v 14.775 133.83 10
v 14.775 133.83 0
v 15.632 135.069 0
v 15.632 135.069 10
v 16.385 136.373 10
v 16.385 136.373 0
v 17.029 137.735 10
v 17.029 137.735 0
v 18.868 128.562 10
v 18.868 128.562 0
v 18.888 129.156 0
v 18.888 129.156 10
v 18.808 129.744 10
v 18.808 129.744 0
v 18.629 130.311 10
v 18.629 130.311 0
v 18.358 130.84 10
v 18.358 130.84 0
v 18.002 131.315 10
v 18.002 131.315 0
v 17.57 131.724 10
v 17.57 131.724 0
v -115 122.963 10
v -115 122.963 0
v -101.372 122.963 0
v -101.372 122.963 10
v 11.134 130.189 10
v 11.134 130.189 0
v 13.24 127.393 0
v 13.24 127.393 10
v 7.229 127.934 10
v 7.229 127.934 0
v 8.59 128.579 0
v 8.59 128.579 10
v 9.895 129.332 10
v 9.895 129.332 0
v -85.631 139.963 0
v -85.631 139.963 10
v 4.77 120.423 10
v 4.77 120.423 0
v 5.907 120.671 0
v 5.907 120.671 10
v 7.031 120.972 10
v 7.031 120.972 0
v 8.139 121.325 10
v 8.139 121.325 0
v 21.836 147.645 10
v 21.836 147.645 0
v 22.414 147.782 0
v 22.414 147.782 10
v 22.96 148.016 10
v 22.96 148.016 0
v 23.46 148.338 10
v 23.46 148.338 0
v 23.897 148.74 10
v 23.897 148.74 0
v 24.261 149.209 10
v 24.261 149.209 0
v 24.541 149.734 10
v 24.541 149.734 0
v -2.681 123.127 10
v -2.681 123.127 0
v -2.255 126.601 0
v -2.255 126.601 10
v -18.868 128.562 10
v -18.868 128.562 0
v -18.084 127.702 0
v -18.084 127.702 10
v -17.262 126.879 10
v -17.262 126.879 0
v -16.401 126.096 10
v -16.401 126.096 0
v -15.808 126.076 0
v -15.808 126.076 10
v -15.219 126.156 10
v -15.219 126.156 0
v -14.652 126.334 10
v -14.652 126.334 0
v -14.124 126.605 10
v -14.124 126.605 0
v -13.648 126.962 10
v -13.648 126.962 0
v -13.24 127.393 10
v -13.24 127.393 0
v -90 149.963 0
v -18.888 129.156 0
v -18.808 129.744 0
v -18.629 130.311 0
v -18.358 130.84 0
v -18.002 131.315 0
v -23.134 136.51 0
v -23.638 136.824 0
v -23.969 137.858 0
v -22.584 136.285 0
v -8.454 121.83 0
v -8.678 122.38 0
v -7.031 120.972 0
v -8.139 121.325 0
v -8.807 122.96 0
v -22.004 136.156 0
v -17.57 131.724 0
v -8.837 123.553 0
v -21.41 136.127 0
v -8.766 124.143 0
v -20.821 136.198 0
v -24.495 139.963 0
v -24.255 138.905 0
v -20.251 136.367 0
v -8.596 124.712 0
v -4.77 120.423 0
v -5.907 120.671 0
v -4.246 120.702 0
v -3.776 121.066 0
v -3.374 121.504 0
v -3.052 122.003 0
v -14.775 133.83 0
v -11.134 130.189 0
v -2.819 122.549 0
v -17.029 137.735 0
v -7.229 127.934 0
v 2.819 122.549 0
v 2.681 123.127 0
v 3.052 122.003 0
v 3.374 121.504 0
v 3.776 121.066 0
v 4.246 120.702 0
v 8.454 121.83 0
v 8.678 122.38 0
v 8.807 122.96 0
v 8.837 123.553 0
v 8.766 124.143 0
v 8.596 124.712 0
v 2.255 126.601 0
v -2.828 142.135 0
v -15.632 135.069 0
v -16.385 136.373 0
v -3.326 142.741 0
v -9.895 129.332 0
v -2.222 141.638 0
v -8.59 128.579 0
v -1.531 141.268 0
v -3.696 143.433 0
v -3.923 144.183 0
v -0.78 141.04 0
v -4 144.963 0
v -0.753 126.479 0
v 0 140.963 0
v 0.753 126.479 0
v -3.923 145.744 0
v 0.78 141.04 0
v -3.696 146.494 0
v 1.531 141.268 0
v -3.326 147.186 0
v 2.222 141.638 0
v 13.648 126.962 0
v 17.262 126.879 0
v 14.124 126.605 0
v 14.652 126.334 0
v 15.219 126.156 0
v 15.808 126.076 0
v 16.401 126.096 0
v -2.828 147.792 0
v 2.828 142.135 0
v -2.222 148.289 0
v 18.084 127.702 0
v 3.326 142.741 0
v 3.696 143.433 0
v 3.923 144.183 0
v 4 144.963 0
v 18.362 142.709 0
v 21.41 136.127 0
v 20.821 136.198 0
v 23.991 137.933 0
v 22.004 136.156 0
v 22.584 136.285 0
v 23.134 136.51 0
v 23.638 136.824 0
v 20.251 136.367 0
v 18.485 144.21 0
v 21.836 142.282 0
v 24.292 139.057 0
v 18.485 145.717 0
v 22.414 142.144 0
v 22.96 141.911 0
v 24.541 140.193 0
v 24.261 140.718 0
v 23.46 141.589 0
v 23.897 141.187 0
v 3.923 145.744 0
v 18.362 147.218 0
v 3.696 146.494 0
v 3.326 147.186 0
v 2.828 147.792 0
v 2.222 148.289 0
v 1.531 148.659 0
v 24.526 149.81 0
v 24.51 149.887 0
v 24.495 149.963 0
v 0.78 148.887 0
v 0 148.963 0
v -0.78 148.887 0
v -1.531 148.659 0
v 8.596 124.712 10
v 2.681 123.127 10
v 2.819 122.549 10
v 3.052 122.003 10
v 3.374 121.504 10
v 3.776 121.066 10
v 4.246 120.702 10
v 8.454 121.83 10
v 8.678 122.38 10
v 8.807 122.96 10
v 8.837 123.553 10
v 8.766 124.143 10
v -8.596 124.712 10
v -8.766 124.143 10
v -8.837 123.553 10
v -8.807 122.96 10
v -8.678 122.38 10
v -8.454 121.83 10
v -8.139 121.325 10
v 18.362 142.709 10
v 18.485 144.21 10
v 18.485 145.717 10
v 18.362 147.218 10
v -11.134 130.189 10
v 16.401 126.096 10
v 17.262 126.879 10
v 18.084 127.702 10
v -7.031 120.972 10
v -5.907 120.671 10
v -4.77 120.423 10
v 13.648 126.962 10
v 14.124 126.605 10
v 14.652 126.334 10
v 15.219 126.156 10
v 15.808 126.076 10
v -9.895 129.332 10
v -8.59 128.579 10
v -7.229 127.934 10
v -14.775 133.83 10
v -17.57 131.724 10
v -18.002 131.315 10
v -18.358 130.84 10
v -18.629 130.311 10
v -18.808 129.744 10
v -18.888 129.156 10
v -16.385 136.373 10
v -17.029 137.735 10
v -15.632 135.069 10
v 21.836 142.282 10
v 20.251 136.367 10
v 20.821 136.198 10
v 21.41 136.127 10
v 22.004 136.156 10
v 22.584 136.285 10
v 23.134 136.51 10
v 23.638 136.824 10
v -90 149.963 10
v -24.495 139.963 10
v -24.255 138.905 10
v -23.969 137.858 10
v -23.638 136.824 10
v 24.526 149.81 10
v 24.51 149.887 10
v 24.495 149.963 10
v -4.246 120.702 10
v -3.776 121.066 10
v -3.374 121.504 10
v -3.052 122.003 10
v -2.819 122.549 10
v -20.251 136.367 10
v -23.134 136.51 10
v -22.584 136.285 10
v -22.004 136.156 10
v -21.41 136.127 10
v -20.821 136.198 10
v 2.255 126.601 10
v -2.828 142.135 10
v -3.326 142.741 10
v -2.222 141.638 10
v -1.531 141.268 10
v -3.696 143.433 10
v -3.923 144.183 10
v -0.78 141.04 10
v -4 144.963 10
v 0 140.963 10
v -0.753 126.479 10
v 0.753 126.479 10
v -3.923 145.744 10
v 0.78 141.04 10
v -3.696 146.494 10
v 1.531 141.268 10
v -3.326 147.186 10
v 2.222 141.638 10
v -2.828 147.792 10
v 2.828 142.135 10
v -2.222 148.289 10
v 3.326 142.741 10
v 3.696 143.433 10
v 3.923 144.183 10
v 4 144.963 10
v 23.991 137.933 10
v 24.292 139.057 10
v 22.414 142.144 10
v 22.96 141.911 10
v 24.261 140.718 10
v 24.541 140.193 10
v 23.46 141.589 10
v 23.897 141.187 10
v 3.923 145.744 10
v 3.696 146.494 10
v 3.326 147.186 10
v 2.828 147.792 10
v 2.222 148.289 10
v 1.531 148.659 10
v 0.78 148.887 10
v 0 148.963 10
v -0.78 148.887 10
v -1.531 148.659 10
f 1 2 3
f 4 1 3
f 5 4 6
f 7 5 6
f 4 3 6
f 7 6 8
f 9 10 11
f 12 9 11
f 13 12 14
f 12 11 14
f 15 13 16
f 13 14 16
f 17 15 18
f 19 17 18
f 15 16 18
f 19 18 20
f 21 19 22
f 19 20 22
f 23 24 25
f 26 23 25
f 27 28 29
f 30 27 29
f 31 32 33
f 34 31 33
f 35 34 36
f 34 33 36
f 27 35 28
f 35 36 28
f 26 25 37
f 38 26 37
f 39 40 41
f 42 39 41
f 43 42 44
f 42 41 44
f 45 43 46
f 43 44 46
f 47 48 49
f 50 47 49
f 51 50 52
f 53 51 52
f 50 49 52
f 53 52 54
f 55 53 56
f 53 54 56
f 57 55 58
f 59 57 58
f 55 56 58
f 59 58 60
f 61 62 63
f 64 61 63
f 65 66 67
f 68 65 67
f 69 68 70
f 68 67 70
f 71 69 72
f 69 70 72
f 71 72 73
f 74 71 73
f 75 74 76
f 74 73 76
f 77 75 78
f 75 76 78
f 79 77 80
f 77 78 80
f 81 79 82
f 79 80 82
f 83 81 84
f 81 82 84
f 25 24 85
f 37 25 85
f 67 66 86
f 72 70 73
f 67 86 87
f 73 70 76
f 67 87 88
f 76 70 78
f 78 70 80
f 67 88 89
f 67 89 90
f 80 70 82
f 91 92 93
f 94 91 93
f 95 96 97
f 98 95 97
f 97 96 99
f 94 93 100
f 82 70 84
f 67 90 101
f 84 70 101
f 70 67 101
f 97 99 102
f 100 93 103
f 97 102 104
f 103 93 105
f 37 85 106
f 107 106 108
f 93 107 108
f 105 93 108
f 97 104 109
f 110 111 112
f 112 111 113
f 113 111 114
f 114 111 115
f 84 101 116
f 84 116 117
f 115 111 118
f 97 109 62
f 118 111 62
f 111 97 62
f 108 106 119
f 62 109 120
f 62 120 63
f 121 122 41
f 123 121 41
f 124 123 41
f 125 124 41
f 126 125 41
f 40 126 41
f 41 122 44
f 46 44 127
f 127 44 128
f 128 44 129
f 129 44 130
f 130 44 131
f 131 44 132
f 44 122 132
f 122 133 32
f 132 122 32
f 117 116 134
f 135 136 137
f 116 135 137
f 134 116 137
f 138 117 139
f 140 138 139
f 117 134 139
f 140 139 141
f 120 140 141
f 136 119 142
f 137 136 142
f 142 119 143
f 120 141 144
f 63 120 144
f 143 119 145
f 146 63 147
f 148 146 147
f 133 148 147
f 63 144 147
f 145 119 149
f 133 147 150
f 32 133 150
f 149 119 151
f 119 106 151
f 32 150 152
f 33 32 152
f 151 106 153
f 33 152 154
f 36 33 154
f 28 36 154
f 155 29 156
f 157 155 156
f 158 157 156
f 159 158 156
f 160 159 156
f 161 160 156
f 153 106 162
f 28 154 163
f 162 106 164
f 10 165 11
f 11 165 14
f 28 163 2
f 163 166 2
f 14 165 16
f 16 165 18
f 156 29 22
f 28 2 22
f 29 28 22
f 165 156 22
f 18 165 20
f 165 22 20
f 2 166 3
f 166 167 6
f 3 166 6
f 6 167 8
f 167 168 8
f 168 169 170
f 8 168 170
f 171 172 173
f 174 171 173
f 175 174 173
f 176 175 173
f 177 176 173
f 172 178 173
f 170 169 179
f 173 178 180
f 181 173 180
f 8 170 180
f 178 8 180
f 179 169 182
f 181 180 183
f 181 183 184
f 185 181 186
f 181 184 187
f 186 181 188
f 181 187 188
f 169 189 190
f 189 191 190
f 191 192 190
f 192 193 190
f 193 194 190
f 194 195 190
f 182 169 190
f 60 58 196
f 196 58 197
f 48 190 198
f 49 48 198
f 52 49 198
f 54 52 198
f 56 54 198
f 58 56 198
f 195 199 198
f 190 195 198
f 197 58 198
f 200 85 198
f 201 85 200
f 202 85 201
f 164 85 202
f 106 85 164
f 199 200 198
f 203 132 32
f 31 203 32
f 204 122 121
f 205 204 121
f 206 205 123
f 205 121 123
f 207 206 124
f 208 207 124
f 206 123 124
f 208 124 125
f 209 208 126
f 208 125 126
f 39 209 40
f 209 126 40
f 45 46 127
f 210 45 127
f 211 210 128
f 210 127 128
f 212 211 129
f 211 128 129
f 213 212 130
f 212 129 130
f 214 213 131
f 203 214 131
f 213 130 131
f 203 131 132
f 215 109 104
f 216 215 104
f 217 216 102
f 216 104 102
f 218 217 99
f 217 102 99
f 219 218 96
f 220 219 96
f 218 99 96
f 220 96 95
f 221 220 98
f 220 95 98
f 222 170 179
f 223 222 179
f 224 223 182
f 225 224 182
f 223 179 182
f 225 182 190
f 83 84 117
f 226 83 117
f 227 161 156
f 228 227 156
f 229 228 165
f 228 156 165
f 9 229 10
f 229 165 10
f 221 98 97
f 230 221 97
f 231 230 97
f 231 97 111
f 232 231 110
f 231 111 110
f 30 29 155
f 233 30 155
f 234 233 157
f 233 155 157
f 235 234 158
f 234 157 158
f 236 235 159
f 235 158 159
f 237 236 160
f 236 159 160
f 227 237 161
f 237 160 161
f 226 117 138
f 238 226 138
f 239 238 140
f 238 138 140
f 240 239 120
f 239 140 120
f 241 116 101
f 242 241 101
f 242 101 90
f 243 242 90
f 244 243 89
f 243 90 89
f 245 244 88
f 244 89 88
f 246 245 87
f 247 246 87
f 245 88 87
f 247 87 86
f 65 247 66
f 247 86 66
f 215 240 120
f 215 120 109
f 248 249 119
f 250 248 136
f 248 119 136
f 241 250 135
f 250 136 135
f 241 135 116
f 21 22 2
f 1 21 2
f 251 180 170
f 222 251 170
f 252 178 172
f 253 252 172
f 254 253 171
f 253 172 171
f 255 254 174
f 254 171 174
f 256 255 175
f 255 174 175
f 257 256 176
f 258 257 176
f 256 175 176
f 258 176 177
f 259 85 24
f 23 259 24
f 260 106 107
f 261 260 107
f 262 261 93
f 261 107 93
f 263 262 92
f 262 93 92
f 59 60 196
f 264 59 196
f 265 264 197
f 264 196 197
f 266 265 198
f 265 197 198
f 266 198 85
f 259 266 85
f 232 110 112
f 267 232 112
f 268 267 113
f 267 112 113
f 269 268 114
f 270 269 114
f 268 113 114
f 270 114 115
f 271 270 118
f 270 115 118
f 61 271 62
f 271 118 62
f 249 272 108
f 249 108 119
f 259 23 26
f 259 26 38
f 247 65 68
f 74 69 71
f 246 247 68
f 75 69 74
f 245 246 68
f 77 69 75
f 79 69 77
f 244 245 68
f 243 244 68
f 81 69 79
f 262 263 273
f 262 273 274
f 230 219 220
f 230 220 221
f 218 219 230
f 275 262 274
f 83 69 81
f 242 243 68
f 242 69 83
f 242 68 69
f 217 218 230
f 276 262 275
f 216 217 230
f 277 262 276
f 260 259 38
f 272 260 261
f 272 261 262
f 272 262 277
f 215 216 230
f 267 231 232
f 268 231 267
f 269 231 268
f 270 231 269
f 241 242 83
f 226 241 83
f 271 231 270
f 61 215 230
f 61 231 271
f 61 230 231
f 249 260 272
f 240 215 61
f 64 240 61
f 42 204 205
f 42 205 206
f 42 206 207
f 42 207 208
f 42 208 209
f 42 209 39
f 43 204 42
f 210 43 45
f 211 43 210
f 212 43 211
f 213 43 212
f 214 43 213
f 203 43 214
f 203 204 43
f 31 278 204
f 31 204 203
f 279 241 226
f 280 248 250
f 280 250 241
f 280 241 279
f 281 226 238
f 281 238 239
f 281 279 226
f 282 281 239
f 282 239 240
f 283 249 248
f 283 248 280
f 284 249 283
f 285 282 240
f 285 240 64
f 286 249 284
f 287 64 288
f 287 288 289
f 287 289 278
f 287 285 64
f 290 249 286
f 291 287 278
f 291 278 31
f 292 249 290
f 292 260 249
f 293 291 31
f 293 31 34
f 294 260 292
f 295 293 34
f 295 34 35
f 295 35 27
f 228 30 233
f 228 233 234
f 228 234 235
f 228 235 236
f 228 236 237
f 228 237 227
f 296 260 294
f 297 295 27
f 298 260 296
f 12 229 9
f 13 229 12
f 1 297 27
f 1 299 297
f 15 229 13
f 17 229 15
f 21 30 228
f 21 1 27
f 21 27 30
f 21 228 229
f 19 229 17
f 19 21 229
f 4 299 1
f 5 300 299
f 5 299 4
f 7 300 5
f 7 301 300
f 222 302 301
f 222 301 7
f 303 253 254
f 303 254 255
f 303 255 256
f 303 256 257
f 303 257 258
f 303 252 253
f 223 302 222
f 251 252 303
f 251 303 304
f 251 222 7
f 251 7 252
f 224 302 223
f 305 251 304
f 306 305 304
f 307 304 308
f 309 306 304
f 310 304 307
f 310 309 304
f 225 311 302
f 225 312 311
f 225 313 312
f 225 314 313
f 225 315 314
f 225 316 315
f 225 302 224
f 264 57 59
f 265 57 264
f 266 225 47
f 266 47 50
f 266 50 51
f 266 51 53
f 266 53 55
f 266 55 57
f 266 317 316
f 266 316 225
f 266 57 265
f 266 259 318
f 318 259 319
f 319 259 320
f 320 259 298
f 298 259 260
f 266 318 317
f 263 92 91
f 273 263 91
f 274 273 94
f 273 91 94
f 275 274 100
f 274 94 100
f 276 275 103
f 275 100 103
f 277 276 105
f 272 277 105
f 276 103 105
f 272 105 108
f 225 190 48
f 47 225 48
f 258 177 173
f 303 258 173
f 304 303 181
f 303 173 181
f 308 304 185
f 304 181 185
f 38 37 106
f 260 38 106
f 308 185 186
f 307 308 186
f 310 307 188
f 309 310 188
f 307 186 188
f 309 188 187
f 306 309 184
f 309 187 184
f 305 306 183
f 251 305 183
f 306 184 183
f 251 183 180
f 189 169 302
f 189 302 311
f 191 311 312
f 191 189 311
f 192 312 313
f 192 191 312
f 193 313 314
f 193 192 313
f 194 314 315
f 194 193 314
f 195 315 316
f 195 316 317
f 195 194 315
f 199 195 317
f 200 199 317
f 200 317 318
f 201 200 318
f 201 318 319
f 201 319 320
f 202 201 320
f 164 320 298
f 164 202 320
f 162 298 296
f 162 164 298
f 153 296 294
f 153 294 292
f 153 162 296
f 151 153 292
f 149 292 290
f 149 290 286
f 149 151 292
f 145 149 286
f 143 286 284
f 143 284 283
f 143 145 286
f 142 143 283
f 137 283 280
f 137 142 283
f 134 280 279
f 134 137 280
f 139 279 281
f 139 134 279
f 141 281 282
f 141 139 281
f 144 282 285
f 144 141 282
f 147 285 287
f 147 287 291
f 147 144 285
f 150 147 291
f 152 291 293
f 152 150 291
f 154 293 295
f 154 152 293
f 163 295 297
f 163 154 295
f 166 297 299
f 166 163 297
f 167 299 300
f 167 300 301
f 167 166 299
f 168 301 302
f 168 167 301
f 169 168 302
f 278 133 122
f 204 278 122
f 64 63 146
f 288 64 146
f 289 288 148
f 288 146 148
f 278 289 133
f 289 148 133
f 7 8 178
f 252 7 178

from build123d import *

# Parameters (mm, degrees)
SKETCH1_R           = 4
BOSS_EXTRUDE1_DEPTH = 10


with BuildPart() as part:
    # Sketch1 → Boss-Extrude1 (new body)
    with BuildSketch(Plane.XY):
        with BuildLine():
            Line((24.494897428, 149.96344327), (-90, 149.96344327))
            Line((-90, 149.96344327), (-115, 122.96344327))
            Line((-115, 122.96344327), (-101.371578153, 122.96344327))
            Line((-101.371578153, 122.96344327), (-85.630837413, 139.96344327))
            Line((-85.630837413, 139.96344327), (-24.494897428, 139.96344327))
            ThreePointArc((-24.494897428, 139.96344327), (-24.117560965, 138.379883968), (-23.63796439, 136.824239409))
            ThreePointArc((-23.63796439, 136.824239409), (-22.00386591, 136.155983342), (-20.251106776, 136.367358443))
            Line((-20.251106776, 136.367358443), (-17.029339789, 137.734917393))
            ThreePointArc((-17.029339789, 137.734917393), (-16.02146997, 135.71344327), (-14.774756936, 133.829865342))
            Line((-14.774756936, 133.829865342), (-17.569981221, 131.723512761))
            ThreePointArc((-17.569981221, 131.723512761), (-18.629416995, 130.311266375), (-18.867739506, 128.561967545))
            ThreePointArc((-18.867739506, 128.561967545), (-17.67766953, 127.28577374), (-16.401475725, 126.095703764))
            ThreePointArc((-16.401475725, 126.095703764), (-14.652176895, 126.334026275), (-13.239930509, 127.393462049))
            Line((-13.239930509, 127.393462049), (-11.133577928, 130.188686334))
            ThreePointArc((-11.133577928, 130.188686334), (-9.25, 128.9419733), (-7.228525877, 127.934103481))
            Line((-7.228525877, 127.934103481), (-8.596084827, 124.712336494))
            ThreePointArc((-8.596084827, 124.712336494), (-8.807459928, 122.95957736), (-8.139203861, 121.32547888))
            ThreePointArc((-8.139203861, 121.32547888), (-6.470476128, 120.815297613), (-4.770224884, 120.422763684))
            ThreePointArc((-4.770224884, 120.422763684), (-3.374448914, 121.503806447), (-2.681125555, 123.127427934))
            Line((-2.681125555, 123.127427934), (-2.254582853, 126.601339465))
            ThreePointArc((-2.254582853, 126.601339465), (0, 126.46344327), (2.254582853, 126.601339465))
            Line((2.254582853, 126.601339465), (2.681125555, 123.127427934))
            ThreePointArc((2.681125555, 123.127427934), (3.374448914, 121.503806447), (4.770224884, 120.422763684))
            ThreePointArc((4.770224884, 120.422763684), (6.470476128, 120.815297613), (8.139203861, 121.32547888))
            ThreePointArc((8.139203861, 121.32547888), (8.807459928, 122.95957736), (8.596084827, 124.712336494))
            Line((8.596084827, 124.712336494), (7.228525877, 127.934103481))
            ThreePointArc((7.228525877, 127.934103481), (9.25, 128.9419733), (11.133577928, 130.188686334))
            Line((11.133577928, 130.188686334), (13.239930509, 127.393462049))
            ThreePointArc((13.239930509, 127.393462049), (14.652176895, 126.334026275), (16.401475725, 126.095703764))
            ThreePointArc((16.401475725, 126.095703764), (17.67766953, 127.28577374), (18.867739506, 128.561967545))
            ThreePointArc((18.867739506, 128.561967545), (18.629416995, 130.311266375), (17.569981221, 131.723512761))
            Line((17.569981221, 131.723512761), (14.774756936, 133.829865342))
            ThreePointArc((14.774756936, 133.829865342), (16.02146997, 135.71344327), (17.029339789, 137.734917393))
            Line((17.029339789, 137.734917393), (20.251106776, 136.367358443))
            ThreePointArc((20.251106776, 136.367358443), (22.00386591, 136.155983342), (23.63796439, 136.824239409))
            ThreePointArc((23.63796439, 136.824239409), (24.148145657, 138.492967142), (24.540679586, 140.193218386))
            ThreePointArc((24.540679586, 140.193218386), (23.459636823, 141.588994356), (21.836015336, 142.282317715))
            Line((21.836015336, 142.282317715), (18.362103805, 142.708860417))
            ThreePointArc((18.362103805, 142.708860417), (18.5, 144.96344327), (18.362103805, 147.218026123))
            Line((18.362103805, 147.218026123), (21.836015336, 147.644568825))
            ThreePointArc((21.836015336, 147.644568825), (23.459636823, 148.337892184), (24.540679586, 149.733668154))
            ThreePointArc((24.540679586, 149.733668154), (24.518057681, 149.848609344), (24.494897428, 149.96344327))
        make_face()
        with Locations((0, 144.96344327)):
            Circle(SKETCH1_R, mode=Mode.SUBTRACT)
    extrude(amount=BOSS_EXTRUDE1_DEPTH)


solid = part.part
